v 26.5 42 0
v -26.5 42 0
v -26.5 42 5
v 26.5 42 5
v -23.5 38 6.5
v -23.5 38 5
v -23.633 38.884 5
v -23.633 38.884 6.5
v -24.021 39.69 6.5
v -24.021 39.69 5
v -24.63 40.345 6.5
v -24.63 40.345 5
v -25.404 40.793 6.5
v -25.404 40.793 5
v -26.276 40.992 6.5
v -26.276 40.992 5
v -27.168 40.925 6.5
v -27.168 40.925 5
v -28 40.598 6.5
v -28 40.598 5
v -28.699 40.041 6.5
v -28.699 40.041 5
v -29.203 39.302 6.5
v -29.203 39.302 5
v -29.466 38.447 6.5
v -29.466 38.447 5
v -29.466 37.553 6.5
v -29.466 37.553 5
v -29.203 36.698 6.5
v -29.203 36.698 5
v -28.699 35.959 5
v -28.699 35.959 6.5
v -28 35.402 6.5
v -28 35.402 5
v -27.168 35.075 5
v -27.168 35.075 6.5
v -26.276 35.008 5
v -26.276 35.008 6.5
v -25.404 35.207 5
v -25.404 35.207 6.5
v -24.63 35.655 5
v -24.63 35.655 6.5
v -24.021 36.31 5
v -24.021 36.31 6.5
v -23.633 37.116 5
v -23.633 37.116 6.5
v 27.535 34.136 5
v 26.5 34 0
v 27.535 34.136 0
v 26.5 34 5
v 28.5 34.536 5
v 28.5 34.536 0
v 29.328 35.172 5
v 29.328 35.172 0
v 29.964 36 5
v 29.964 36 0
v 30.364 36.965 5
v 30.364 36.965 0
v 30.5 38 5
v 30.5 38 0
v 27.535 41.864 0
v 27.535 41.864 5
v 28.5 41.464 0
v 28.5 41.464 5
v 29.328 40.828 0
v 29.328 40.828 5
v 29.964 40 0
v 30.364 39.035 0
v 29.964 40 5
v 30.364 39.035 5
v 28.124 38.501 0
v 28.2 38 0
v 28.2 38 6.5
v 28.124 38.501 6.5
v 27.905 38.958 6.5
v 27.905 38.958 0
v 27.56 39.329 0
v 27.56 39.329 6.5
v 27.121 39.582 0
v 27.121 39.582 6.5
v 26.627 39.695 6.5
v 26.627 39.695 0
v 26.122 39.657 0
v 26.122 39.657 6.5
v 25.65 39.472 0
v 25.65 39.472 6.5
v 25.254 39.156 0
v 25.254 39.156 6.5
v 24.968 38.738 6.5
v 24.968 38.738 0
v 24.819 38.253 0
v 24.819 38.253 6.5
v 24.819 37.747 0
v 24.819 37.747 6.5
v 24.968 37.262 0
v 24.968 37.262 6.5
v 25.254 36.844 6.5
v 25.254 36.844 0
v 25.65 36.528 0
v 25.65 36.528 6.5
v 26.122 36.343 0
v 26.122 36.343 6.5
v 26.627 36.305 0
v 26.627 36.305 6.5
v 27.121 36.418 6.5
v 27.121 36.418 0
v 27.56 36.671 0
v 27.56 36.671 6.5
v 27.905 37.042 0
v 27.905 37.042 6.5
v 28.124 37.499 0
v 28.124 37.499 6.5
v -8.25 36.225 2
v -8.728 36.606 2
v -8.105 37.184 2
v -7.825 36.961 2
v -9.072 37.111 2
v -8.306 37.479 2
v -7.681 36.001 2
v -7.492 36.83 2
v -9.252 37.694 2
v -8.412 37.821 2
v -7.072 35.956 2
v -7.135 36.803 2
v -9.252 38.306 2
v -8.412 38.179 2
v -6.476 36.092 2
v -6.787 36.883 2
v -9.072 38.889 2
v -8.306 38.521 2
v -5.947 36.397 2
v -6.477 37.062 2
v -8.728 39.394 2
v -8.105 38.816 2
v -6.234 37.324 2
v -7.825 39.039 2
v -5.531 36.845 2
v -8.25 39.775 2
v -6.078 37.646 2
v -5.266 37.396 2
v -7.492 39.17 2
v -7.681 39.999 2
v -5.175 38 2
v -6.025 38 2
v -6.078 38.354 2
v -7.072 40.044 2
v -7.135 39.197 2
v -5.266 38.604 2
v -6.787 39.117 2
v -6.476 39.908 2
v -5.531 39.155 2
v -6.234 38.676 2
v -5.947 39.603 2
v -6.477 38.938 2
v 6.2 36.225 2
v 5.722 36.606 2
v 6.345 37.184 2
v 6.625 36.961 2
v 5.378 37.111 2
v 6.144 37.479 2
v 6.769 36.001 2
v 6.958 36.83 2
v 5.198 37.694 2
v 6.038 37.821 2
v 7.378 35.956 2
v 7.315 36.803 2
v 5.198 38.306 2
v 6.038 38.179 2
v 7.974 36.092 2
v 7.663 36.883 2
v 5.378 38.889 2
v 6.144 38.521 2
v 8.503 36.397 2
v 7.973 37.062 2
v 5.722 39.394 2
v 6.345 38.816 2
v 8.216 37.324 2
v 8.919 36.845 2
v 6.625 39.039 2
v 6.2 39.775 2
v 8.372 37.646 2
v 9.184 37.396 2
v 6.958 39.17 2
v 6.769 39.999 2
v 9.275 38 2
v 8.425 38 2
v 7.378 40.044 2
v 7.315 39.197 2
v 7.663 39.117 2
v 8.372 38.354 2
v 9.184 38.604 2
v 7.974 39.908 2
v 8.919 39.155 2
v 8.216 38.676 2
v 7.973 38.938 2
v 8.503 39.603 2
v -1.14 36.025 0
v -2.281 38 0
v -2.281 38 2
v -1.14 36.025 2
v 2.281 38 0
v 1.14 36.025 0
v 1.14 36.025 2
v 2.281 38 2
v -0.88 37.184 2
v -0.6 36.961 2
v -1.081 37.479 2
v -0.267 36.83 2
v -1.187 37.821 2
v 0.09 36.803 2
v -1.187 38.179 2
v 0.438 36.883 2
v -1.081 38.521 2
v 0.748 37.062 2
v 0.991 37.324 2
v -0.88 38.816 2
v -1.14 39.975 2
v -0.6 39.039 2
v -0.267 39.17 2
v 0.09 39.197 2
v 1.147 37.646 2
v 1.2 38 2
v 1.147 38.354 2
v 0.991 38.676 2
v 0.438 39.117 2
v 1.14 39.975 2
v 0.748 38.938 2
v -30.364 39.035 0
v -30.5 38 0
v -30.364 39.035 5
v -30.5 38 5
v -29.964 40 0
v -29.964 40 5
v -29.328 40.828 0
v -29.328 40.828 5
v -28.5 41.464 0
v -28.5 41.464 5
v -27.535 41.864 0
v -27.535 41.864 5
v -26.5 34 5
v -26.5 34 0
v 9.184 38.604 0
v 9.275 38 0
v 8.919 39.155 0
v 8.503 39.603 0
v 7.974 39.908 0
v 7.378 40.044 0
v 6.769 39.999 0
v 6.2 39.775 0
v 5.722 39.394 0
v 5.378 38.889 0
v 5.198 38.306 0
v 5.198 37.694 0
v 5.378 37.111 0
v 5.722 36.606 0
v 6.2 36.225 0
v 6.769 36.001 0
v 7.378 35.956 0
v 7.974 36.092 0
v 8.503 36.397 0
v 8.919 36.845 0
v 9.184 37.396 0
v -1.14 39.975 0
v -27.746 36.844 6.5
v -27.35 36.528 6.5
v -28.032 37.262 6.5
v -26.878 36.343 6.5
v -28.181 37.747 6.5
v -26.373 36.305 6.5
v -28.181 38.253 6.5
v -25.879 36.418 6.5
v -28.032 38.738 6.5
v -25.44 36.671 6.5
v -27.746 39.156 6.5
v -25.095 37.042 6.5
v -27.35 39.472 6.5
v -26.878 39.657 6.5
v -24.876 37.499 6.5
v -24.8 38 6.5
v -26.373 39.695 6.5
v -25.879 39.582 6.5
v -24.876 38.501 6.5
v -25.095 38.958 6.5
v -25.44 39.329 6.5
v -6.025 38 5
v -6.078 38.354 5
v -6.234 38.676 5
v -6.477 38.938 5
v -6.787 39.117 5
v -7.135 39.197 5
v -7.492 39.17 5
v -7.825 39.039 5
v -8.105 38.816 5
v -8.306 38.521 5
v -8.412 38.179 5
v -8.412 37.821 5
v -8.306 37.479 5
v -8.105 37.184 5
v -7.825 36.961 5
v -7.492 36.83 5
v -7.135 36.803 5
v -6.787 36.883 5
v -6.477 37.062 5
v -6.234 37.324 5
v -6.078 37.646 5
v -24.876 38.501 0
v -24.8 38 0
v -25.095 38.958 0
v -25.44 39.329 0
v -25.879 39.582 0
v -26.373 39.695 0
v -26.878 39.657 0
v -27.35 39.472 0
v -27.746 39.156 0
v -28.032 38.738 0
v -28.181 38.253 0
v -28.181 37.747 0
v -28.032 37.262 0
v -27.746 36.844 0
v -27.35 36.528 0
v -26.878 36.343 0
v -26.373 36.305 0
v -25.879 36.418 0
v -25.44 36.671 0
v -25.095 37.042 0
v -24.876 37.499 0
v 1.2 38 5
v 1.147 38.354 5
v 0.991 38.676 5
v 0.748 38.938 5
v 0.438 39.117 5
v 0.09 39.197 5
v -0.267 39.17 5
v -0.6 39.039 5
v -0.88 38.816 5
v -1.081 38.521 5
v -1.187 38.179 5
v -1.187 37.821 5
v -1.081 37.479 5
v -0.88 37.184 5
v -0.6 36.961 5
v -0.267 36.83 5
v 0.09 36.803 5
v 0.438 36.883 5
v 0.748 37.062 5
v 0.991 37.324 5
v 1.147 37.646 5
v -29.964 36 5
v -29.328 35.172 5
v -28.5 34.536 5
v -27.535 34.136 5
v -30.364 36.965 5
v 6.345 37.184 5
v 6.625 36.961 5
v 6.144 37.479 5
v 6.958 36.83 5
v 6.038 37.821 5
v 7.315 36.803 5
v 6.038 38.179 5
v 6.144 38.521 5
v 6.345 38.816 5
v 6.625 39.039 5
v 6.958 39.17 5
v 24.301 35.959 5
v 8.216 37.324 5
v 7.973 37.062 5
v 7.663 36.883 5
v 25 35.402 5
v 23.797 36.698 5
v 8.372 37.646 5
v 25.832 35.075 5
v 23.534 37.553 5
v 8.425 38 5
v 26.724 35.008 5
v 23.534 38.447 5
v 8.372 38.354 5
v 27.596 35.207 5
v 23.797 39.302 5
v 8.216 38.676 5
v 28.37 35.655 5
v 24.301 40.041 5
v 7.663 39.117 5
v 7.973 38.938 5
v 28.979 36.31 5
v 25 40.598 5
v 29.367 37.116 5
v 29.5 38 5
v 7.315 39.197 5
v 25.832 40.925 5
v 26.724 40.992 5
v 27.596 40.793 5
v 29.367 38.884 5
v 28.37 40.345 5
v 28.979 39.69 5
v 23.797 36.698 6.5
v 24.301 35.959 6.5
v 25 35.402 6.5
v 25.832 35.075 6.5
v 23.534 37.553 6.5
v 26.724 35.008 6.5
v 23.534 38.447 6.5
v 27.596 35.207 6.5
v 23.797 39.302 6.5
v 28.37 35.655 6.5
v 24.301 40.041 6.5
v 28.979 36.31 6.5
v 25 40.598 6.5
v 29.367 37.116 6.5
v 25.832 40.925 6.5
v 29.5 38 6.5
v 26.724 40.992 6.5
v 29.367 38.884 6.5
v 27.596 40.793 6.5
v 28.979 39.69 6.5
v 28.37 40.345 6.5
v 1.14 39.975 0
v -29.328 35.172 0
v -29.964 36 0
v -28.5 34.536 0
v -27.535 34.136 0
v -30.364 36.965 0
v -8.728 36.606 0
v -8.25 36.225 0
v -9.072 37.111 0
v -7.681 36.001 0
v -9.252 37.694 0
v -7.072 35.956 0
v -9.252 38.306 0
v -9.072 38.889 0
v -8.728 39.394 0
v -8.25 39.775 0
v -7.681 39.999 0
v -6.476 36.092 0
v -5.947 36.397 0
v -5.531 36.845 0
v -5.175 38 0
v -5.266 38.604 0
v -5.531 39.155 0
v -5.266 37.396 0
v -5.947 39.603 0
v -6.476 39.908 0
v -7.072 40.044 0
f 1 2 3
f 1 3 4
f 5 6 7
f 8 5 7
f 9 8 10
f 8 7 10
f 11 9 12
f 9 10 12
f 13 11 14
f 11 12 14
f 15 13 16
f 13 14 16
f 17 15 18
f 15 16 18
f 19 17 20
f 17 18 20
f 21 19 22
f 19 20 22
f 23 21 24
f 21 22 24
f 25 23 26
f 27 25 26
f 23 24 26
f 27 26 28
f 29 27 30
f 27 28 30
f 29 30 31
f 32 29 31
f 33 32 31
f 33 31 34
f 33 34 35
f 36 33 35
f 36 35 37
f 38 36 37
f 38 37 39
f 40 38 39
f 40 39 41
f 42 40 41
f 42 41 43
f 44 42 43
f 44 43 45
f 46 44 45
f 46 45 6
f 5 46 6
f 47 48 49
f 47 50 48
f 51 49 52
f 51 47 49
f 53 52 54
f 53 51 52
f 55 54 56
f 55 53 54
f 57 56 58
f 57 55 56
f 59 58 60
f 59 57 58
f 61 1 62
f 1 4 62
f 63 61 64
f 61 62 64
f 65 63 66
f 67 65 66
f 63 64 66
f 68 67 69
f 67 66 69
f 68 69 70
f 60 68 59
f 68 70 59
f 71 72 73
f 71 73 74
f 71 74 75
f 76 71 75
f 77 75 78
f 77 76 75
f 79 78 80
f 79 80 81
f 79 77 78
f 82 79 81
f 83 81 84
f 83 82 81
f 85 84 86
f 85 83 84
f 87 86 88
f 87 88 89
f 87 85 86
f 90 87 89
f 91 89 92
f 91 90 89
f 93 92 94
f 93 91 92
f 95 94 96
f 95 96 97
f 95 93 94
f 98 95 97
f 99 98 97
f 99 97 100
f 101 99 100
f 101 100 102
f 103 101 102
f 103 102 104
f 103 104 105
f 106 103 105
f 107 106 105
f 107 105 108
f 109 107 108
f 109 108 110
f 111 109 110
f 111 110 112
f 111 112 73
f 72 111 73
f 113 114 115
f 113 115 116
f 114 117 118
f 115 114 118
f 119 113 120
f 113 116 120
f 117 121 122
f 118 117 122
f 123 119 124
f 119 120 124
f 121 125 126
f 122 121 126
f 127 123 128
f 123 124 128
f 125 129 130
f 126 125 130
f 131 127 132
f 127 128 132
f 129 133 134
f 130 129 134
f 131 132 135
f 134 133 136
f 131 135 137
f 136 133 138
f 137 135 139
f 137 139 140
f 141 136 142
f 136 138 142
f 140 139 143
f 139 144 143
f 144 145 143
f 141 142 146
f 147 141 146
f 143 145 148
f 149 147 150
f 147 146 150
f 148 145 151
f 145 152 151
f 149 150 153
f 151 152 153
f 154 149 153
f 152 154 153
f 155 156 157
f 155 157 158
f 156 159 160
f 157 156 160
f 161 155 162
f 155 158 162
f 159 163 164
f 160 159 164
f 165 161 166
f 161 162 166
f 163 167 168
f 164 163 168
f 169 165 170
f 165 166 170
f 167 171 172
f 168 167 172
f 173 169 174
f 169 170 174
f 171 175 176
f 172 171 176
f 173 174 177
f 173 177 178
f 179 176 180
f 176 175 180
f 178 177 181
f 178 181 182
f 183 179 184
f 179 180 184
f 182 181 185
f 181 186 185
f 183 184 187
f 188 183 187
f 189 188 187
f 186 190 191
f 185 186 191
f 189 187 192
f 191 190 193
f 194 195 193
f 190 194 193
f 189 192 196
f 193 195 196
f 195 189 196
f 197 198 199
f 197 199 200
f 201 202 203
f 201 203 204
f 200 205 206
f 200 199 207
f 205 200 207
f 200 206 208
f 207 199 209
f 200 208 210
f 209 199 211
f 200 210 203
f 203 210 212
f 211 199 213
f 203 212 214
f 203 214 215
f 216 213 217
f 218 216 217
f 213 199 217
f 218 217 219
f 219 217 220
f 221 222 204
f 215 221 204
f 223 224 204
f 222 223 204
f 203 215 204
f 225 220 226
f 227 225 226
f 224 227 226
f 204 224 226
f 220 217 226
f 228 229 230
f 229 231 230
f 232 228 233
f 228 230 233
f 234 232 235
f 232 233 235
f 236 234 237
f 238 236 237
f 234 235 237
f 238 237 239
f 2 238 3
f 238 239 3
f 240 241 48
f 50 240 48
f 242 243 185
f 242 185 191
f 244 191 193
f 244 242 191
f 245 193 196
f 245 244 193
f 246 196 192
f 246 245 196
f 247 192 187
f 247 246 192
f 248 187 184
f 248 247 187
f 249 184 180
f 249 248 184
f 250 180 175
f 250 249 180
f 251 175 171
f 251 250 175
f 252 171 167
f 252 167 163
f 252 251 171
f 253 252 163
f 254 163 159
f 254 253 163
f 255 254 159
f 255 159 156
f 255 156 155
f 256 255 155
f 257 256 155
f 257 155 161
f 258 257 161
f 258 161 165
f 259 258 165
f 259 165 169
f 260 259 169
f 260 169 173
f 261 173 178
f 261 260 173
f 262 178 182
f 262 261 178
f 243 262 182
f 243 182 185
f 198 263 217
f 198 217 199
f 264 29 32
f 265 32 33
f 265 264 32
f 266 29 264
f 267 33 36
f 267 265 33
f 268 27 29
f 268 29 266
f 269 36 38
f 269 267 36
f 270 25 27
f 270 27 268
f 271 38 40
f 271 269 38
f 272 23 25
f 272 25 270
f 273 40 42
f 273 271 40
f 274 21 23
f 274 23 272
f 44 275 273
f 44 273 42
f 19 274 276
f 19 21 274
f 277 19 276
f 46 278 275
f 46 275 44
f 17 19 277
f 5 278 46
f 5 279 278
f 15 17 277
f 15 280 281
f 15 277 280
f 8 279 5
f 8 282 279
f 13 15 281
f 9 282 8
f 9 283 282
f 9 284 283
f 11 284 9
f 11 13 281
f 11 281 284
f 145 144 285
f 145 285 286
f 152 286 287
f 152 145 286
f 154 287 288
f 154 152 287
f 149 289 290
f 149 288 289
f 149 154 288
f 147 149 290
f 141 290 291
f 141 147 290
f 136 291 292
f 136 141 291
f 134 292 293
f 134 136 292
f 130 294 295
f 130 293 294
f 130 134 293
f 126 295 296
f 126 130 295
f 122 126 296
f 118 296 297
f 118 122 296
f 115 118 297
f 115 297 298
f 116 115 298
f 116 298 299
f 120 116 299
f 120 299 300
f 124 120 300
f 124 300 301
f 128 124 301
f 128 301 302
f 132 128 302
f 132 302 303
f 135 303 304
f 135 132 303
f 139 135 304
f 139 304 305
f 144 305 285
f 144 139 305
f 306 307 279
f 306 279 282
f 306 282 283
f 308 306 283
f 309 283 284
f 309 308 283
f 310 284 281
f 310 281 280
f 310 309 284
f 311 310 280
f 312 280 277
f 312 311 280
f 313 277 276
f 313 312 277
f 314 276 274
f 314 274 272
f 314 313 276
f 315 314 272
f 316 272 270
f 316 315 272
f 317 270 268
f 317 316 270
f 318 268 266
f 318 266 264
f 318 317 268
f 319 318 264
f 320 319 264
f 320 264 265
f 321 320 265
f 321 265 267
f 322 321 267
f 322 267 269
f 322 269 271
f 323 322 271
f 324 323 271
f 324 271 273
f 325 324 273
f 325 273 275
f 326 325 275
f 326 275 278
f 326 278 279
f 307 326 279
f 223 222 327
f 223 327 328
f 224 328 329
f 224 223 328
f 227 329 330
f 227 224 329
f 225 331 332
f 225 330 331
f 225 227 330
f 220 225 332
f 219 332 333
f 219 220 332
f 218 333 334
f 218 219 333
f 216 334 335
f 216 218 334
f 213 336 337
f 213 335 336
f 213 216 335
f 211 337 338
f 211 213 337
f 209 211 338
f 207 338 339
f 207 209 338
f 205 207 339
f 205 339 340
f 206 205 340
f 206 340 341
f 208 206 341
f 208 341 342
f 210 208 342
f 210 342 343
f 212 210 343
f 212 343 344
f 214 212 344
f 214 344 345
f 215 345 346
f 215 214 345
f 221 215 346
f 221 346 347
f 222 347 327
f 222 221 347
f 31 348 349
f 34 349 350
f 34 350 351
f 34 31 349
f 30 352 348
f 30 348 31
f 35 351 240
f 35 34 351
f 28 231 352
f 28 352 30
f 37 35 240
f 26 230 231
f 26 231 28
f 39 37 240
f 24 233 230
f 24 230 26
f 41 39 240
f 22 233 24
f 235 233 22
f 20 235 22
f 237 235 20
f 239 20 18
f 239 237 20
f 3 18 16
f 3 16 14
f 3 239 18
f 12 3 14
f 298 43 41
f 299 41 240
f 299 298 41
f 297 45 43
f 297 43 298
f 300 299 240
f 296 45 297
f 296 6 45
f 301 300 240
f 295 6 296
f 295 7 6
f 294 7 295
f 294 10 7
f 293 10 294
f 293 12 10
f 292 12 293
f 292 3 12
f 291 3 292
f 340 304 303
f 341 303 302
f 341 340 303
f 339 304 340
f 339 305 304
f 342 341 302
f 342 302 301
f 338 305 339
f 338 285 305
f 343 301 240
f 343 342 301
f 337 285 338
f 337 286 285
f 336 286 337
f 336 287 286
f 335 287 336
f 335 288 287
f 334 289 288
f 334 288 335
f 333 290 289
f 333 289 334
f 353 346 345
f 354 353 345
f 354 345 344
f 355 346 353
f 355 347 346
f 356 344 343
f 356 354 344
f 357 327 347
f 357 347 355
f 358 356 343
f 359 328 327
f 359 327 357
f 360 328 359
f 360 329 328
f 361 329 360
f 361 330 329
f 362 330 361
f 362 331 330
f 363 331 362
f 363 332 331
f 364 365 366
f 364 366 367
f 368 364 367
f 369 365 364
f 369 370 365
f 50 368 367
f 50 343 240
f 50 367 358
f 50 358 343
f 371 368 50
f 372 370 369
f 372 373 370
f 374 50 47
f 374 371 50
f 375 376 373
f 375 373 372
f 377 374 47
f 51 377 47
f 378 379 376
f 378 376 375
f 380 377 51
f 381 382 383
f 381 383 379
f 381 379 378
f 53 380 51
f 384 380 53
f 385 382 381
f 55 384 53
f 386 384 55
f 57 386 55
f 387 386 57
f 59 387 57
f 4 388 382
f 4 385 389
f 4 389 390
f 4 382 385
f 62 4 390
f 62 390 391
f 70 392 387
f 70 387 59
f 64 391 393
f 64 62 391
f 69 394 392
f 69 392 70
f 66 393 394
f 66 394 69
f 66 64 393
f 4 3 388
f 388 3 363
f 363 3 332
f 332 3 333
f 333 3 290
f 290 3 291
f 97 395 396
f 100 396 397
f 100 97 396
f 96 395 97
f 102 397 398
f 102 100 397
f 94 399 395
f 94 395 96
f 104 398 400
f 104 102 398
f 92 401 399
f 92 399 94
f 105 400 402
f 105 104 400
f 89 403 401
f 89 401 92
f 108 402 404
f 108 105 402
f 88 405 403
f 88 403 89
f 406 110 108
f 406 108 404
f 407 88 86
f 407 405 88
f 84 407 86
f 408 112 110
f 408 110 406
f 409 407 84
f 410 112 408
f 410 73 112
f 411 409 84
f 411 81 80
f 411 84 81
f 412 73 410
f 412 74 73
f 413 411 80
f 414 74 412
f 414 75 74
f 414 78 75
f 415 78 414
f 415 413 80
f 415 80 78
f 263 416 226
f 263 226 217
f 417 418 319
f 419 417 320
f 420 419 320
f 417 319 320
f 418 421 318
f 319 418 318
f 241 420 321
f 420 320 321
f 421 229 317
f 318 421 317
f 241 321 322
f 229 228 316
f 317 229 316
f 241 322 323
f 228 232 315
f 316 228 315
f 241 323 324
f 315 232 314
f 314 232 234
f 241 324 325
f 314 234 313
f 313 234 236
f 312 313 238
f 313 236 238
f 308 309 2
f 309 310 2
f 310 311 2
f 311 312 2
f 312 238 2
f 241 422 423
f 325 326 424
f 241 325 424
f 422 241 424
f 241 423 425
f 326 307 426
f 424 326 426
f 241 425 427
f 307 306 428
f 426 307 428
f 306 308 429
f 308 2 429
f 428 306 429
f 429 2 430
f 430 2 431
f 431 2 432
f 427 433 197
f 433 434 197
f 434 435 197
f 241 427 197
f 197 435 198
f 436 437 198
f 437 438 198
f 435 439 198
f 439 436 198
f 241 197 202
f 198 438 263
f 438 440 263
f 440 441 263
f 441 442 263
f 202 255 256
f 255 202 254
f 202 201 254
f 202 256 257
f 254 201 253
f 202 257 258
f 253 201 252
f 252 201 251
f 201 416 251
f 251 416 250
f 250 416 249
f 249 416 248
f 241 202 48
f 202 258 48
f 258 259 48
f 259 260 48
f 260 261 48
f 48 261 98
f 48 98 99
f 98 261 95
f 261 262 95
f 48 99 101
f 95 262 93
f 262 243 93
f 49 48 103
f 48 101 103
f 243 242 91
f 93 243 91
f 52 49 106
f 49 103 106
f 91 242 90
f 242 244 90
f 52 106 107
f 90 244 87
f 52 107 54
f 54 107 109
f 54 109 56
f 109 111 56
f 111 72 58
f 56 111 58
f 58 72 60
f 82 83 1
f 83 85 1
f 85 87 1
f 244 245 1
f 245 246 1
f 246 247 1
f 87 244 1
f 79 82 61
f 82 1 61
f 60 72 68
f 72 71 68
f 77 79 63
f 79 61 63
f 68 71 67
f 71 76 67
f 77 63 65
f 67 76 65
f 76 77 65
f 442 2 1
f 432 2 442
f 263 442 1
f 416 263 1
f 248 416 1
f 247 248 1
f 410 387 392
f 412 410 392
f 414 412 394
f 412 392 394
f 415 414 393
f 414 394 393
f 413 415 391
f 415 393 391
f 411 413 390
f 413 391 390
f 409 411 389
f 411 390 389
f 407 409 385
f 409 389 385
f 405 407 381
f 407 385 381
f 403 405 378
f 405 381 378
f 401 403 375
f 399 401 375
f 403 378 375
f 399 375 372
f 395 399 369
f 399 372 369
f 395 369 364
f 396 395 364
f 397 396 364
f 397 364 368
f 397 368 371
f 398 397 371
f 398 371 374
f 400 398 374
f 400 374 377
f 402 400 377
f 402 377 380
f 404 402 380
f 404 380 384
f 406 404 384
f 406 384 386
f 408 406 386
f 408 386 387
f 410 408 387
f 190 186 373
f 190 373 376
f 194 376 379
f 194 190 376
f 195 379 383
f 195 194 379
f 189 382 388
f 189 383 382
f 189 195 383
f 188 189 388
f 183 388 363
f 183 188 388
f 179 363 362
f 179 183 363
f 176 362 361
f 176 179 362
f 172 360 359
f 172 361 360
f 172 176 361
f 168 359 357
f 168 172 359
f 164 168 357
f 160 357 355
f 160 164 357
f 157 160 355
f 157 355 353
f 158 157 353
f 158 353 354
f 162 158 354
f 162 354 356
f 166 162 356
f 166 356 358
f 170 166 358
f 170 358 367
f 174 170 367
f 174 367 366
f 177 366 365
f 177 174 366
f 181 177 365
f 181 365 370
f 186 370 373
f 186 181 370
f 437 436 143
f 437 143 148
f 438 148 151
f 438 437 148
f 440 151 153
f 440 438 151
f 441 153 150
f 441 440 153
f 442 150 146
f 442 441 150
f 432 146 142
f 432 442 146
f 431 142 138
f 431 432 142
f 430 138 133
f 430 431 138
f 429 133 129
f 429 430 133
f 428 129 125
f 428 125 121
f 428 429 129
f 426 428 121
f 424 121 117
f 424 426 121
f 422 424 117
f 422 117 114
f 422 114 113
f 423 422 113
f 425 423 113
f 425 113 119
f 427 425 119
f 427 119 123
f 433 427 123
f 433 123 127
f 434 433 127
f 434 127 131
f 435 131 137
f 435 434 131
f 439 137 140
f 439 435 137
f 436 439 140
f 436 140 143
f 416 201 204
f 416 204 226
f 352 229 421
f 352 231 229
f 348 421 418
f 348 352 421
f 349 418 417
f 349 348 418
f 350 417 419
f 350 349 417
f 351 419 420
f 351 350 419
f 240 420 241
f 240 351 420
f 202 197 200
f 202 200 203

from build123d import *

# Parameters (mm, degrees)
F2_W      = 61
F2_H      = 8
F2_R      = 3
F5_DEPTH  = 5
F1_R      = 3
F1_R_2    = 1.7
F6_DEPTH  = 6.5
F0_R      = 1.7
F7_DEPTH  = 12.5
F3_R      = 2.05
F8_DEPTH  = 2
F9_DEPTH  = 2
F10_R     = 3.99999
F4_R      = 1.2
F11_DEPTH = 6.501


# Not quite as in the source:
# - a fillet or chamfer is up to 0.001 mm smaller than in the source, because OpenCascade refuses the exact size


with BuildPart() as f5:
    # F2 (on face) → F5 (new body)
    with BuildSketch(Plane.XY):
        with Locations((0, 38)):
            Rectangle(F2_W, F2_H)
        with Locations((-26.5, 38)):
            Circle(F2_R, mode=Mode.SUBTRACT)
        Polygon((1.1402667816, 36.025), (0, 36.025), (-1.1402667816, 36.025), (-2.2805335633, 38), (-1.1402667816, 39.975), (0, 39.975), (1.1402667816, 39.975), (2.2805335633, 38), align=None, mode=Mode.SUBTRACT)
        with Locations((26.5, 38)):
            Circle(F2_R, mode=Mode.SUBTRACT)
        Polygon((-1.1402667816, 36.025), (0, 36.025), (1.1402667816, 36.025), (2.2805335633, 38), (1.1402667816, 39.975), (0, 39.975), (-1.1402667816, 39.975), (-2.2805335633, 38), align=None)
        with Locations((-26.5, 38)):
            Circle(F2_R)
        with Locations((26.5, 38)):
            Circle(F2_R)
    extrude(amount=F5_DEPTH)

    # F1 (on Top) → F6 (join)
    with BuildSketch(Plane.XY):
        with Locations((-26.5, 38)):
            Circle(F1_R)
        with Locations((-26.5, 38)):
            Circle(F1_R_2, mode=Mode.SUBTRACT)
        with Locations((26.5, 38)):
            Circle(F1_R)
        with Locations((26.5, 38)):
            Circle(F1_R_2, mode=Mode.SUBTRACT)
    extrude(amount=F6_DEPTH)

    # F0 (on Top) → F7 (cut, symmetric)
    with BuildSketch(Plane.XY):
        with Locations((-26.5, 38)):
            Circle(F0_R)
        with Locations((26.5, 38)):
            Circle(F0_R)
        with Locations((-26.5, -38)):
            Circle(F0_R)
        with Locations((26.5, -38)):
            Circle(F0_R)
    extrude(amount=F7_DEPTH, both=True, mode=Mode.SUBTRACT)

    # F3 (on face) → F8 (cut)
    with BuildSketch(Plane.XY):
        with Locations((-7.225, 38)):
            Circle(F3_R)
        with Locations((7.225, 38)):
            Circle(F3_R)
    extrude(amount=F8_DEPTH, mode=Mode.SUBTRACT)

    # F2 (on face) → F9 (cut)
    with BuildSketch(Plane.XY):
        Polygon((-1.1402667816, 36.025), (0, 36.025), (1.1402667816, 36.025), (2.2805335633, 38), (1.1402667816, 39.975), (0, 39.975), (-1.1402667816, 39.975), (-2.2805335633, 38), align=None)
    extrude(amount=F9_DEPTH, mode=Mode.SUBTRACT)

    # F10 (radius 4 in the source; OpenCascade refuses exactly that, so slightly less here)
    f10_edges = [f5.edges().sort_by_distance(p)[0] for p in [
        (-30.5, 42, 2.5),
        (-30.5, 34, 2.5),
        (30.5, 42, 2.5),
        (30.5, 34, 2.5),
    ]]
    fillet(f10_edges, radius=F10_R)

    # F4 (on face) → F11 (cut, through all)
    with BuildSketch(Plane.XY):
        with Locations((-7.225, 38)):
            Circle(F4_R)
        with Locations((0, 38)):
            Circle(F4_R)
        with Locations((7.225, 38)):
            Circle(F4_R)
    extrude(amount=F11_DEPTH, mode=Mode.SUBTRACT)


solid = f5.part
